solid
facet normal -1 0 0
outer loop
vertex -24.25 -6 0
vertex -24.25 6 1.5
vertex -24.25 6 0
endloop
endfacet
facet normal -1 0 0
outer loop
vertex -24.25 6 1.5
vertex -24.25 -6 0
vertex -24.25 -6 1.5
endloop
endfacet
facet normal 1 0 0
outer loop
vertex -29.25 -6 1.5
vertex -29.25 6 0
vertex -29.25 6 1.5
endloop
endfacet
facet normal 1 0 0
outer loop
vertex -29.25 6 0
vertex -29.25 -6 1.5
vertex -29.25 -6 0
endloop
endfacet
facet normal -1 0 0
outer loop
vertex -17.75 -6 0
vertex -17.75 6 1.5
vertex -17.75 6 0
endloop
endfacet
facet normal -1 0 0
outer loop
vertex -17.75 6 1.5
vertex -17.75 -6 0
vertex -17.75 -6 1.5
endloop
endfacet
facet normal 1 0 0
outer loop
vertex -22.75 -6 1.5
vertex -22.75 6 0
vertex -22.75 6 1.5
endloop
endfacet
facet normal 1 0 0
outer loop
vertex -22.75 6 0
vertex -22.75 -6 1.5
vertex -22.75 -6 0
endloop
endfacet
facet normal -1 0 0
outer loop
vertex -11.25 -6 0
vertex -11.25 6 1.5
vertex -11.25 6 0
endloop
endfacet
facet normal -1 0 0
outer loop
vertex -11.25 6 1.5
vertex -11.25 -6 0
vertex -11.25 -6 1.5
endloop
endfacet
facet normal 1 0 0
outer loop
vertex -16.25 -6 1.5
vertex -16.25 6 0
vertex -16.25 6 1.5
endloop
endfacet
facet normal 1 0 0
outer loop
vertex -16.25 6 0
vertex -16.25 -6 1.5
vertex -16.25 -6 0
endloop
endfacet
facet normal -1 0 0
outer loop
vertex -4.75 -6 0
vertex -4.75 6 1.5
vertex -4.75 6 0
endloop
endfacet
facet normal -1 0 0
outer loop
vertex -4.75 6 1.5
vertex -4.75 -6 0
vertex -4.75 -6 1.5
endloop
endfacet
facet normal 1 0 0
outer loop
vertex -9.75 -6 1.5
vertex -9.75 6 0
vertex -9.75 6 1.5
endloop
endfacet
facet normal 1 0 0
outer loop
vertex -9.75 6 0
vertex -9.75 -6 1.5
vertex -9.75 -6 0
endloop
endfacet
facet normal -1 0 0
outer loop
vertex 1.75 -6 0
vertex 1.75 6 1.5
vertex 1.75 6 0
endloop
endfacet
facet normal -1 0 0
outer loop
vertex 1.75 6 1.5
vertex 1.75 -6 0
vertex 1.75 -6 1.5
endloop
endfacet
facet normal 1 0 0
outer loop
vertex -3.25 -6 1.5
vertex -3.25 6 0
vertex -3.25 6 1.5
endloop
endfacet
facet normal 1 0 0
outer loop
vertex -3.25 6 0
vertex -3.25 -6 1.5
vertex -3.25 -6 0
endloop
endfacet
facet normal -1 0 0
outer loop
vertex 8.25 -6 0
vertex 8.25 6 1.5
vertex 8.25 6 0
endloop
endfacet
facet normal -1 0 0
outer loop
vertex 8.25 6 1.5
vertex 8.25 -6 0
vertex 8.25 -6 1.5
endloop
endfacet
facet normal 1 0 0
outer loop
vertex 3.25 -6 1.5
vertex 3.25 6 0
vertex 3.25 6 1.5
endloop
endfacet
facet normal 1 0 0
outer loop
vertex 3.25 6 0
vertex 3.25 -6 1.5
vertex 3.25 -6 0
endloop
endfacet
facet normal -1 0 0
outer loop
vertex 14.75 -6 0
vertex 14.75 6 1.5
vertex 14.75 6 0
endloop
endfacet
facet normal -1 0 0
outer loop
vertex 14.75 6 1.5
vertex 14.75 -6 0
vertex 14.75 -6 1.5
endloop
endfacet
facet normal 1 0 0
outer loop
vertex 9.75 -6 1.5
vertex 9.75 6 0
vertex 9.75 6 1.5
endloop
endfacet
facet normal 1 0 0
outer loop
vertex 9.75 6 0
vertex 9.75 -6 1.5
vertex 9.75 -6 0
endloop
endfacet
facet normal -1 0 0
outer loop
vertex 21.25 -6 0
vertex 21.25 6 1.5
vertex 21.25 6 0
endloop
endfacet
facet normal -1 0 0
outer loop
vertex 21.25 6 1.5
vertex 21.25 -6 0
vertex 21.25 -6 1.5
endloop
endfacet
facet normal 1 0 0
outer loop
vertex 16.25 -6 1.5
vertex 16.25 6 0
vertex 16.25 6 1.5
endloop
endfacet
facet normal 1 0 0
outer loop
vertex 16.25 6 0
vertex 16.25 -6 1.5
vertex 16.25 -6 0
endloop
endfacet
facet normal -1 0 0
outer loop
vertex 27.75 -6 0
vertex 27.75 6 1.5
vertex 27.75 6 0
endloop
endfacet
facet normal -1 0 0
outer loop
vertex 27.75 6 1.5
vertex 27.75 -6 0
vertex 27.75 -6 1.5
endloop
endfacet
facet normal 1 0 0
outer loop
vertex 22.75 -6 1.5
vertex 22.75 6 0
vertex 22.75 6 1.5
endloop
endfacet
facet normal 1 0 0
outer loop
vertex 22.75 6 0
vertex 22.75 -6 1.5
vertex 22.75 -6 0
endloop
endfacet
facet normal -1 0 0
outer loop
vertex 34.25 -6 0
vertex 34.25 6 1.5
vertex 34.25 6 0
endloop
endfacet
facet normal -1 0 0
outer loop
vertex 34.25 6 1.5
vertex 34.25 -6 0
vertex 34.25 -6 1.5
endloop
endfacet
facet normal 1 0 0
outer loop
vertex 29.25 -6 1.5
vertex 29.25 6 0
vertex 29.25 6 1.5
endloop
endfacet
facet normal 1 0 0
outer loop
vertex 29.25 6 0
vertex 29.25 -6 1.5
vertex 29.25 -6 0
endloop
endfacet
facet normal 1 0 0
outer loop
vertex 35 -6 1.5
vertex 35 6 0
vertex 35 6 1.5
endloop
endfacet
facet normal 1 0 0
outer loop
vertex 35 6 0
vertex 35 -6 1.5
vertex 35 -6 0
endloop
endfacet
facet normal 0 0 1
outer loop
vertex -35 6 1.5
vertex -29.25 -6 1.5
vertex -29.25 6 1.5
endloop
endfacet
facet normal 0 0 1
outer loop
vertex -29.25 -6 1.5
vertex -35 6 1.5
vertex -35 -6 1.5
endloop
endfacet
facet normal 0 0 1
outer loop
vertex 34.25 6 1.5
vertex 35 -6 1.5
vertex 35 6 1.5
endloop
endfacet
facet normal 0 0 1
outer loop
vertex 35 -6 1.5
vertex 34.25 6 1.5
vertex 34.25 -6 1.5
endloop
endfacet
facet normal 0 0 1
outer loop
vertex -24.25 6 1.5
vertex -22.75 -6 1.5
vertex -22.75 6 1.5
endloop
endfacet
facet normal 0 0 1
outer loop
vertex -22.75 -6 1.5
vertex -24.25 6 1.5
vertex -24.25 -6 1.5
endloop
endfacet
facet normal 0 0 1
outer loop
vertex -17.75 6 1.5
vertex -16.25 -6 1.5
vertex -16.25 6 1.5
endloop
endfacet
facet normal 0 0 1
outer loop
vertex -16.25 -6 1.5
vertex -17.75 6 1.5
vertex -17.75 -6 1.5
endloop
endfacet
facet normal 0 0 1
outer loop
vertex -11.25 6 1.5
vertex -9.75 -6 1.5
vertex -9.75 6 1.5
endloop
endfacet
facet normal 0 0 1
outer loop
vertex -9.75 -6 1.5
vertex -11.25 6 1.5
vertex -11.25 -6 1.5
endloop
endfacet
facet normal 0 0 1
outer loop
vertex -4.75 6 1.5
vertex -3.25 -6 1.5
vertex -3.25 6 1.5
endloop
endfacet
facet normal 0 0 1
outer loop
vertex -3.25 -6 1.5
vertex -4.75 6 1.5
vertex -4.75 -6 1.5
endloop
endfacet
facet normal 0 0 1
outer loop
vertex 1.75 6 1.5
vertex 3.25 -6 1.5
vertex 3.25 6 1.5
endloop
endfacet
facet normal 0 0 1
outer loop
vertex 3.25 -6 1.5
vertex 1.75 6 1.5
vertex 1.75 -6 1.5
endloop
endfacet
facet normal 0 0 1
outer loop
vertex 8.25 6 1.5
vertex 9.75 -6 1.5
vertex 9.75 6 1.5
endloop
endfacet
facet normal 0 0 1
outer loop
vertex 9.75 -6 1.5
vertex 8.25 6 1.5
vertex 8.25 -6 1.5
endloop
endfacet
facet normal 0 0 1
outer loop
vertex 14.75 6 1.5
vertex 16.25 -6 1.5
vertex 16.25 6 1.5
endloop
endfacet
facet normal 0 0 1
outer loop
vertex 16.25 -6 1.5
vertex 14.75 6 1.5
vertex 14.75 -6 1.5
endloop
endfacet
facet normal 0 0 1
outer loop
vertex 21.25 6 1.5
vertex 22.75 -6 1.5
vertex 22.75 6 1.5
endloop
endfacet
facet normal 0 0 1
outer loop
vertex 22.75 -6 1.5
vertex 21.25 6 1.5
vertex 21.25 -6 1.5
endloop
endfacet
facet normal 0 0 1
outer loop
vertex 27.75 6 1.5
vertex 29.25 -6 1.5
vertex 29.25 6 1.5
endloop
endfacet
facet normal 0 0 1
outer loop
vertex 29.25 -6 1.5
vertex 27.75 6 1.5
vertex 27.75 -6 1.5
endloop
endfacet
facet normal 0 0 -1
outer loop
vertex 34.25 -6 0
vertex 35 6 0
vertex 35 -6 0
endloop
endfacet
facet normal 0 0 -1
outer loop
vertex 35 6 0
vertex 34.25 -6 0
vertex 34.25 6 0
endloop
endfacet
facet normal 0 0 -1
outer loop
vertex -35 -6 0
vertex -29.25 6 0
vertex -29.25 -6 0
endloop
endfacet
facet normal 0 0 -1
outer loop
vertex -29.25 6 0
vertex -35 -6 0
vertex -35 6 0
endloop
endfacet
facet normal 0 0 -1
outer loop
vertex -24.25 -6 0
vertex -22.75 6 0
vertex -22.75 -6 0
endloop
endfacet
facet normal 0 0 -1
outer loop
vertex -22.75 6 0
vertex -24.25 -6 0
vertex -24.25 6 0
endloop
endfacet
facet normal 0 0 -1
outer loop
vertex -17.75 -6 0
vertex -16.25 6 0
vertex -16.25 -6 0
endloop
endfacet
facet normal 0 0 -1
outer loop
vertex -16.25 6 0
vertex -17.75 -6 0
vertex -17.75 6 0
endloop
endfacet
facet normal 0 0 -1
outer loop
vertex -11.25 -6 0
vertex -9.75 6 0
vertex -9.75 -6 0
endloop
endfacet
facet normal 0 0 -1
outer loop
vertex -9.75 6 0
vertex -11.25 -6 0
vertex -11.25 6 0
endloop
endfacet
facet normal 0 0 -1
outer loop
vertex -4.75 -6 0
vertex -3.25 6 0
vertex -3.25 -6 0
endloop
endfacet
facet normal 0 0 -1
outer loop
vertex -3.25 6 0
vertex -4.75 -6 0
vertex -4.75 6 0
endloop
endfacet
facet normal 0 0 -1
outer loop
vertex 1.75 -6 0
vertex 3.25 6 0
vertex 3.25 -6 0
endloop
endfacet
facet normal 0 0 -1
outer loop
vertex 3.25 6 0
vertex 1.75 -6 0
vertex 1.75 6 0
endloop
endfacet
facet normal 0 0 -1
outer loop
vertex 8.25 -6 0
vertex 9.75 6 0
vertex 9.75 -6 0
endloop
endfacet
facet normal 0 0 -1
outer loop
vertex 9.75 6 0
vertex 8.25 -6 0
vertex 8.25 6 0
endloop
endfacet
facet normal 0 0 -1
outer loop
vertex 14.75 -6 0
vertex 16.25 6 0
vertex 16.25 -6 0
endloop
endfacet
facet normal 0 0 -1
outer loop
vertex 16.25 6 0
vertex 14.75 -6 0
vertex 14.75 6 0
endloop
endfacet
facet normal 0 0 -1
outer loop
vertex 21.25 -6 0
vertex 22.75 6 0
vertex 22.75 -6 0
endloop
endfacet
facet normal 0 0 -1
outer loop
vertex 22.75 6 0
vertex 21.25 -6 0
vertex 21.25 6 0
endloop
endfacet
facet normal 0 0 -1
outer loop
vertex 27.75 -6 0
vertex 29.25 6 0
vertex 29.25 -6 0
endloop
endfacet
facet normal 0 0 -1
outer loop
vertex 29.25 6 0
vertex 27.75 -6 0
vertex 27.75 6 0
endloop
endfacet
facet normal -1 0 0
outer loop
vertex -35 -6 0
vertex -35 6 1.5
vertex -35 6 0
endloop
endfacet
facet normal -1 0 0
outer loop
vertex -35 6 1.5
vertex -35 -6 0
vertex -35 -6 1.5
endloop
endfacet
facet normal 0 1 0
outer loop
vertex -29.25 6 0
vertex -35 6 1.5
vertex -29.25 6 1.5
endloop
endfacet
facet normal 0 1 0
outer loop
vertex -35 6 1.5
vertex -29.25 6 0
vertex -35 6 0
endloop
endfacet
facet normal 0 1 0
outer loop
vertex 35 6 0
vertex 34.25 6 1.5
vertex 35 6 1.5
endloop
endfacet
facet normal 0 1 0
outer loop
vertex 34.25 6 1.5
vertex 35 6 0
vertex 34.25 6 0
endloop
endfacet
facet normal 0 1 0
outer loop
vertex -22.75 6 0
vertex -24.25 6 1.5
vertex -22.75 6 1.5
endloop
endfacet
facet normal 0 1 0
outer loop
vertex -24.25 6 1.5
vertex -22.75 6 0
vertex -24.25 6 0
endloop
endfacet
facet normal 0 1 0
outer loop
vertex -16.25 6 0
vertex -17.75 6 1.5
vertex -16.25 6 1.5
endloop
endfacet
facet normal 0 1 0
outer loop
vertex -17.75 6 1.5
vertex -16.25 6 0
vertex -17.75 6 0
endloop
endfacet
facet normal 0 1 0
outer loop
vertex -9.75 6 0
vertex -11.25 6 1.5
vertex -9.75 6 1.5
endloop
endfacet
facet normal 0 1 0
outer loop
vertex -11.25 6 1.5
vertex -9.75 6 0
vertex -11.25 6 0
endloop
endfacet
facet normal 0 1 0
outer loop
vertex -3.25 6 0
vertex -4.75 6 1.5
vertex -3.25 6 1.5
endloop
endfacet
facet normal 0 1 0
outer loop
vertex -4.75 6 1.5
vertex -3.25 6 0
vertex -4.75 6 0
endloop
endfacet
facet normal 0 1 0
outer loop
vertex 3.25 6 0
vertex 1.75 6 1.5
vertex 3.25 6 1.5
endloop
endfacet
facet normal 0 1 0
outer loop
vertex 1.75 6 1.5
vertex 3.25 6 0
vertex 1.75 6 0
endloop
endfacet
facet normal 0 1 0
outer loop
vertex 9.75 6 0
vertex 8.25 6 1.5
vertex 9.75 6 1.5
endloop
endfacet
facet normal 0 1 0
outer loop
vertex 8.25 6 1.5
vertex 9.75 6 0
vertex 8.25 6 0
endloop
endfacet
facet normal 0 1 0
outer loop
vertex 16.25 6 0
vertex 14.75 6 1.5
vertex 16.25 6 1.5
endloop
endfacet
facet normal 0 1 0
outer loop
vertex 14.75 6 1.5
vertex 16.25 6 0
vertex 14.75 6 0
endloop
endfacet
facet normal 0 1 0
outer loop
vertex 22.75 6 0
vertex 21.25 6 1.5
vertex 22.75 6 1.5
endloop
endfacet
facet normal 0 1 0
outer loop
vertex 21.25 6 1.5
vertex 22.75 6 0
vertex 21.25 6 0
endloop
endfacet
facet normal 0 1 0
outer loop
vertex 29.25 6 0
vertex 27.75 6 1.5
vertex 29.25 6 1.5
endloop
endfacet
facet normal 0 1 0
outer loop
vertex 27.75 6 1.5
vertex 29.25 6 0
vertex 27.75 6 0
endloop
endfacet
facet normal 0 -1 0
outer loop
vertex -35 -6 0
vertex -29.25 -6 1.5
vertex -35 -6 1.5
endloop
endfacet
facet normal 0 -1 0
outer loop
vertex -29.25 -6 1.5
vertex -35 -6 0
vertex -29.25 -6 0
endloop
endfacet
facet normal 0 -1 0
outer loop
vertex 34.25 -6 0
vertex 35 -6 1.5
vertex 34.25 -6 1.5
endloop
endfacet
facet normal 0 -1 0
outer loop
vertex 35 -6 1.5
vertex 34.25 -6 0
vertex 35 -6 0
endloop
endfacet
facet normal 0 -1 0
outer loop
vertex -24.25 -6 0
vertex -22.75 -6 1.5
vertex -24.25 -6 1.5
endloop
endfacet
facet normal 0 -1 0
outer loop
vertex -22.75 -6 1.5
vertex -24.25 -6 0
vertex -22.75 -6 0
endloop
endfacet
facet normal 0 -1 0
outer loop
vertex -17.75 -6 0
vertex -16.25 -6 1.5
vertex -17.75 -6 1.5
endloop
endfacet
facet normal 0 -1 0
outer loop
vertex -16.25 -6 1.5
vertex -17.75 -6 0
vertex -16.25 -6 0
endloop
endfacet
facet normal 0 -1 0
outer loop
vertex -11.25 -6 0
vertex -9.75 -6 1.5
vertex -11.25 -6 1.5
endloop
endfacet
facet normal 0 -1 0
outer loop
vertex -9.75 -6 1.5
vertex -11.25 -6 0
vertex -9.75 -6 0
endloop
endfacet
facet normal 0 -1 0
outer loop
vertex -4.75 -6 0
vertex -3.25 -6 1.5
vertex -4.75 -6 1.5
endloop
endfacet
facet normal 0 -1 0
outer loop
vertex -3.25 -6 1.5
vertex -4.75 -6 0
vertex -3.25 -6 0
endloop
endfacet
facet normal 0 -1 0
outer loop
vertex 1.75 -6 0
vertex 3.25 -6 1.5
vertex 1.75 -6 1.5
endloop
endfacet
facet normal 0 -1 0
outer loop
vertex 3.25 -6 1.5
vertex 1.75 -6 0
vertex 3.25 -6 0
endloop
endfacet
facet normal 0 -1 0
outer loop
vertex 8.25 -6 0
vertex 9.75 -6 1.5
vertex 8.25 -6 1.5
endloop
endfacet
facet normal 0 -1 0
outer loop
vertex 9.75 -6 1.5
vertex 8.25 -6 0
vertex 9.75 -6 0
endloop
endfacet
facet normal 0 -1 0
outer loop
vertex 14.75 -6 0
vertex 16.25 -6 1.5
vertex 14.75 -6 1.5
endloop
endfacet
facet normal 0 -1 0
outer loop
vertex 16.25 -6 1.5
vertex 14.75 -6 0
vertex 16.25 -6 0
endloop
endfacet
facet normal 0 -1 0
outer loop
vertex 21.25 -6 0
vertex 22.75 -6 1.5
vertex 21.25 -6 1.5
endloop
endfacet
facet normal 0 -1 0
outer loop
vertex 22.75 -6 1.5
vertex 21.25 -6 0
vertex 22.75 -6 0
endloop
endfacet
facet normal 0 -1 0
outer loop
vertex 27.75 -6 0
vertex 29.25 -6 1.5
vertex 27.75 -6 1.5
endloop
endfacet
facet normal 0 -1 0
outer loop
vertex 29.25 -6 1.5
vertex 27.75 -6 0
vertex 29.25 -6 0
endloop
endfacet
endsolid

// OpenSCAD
// 10-well comb for casting agarose gels
// Print orientation: flat on bed, teeth pointing down (-Y)

// ---------- Parameters ----------
plate_t      = 1.5;   // plate thickness (Z)
spine_l      = 70;    // spine length (X)
spine_w      = 12;    // spine width (Y)
teeth_n      = 10;    // number of teeth
teeth_w      = 5.0;   // tooth width (X)
teeth_l      = 12;    // tooth length (Y)
teeth_pitch  = teeth_w + 1.5; // centre-to-centre spacing (X)
eps          = 0.5;   // cutter overshoot

$fn = 64;

// ---------- Model ----------
difference() {
    // Plate with spine
    union() {
        translate([-spine_l/2, -spine_w/2, 0])
            cube([spine_l, spine_w, plate_t]);
    }

    // Teeth cutters, centred on spine
    for (i = [0 : teeth_n - 1])
        translate([(i - (teeth_n - 1)/2) * teeth_pitch,
                   -spine_w/2 - eps,
                   -eps])
            cube([teeth_w, teeth_l + 2*eps, plate_t + 2*eps]);
}
